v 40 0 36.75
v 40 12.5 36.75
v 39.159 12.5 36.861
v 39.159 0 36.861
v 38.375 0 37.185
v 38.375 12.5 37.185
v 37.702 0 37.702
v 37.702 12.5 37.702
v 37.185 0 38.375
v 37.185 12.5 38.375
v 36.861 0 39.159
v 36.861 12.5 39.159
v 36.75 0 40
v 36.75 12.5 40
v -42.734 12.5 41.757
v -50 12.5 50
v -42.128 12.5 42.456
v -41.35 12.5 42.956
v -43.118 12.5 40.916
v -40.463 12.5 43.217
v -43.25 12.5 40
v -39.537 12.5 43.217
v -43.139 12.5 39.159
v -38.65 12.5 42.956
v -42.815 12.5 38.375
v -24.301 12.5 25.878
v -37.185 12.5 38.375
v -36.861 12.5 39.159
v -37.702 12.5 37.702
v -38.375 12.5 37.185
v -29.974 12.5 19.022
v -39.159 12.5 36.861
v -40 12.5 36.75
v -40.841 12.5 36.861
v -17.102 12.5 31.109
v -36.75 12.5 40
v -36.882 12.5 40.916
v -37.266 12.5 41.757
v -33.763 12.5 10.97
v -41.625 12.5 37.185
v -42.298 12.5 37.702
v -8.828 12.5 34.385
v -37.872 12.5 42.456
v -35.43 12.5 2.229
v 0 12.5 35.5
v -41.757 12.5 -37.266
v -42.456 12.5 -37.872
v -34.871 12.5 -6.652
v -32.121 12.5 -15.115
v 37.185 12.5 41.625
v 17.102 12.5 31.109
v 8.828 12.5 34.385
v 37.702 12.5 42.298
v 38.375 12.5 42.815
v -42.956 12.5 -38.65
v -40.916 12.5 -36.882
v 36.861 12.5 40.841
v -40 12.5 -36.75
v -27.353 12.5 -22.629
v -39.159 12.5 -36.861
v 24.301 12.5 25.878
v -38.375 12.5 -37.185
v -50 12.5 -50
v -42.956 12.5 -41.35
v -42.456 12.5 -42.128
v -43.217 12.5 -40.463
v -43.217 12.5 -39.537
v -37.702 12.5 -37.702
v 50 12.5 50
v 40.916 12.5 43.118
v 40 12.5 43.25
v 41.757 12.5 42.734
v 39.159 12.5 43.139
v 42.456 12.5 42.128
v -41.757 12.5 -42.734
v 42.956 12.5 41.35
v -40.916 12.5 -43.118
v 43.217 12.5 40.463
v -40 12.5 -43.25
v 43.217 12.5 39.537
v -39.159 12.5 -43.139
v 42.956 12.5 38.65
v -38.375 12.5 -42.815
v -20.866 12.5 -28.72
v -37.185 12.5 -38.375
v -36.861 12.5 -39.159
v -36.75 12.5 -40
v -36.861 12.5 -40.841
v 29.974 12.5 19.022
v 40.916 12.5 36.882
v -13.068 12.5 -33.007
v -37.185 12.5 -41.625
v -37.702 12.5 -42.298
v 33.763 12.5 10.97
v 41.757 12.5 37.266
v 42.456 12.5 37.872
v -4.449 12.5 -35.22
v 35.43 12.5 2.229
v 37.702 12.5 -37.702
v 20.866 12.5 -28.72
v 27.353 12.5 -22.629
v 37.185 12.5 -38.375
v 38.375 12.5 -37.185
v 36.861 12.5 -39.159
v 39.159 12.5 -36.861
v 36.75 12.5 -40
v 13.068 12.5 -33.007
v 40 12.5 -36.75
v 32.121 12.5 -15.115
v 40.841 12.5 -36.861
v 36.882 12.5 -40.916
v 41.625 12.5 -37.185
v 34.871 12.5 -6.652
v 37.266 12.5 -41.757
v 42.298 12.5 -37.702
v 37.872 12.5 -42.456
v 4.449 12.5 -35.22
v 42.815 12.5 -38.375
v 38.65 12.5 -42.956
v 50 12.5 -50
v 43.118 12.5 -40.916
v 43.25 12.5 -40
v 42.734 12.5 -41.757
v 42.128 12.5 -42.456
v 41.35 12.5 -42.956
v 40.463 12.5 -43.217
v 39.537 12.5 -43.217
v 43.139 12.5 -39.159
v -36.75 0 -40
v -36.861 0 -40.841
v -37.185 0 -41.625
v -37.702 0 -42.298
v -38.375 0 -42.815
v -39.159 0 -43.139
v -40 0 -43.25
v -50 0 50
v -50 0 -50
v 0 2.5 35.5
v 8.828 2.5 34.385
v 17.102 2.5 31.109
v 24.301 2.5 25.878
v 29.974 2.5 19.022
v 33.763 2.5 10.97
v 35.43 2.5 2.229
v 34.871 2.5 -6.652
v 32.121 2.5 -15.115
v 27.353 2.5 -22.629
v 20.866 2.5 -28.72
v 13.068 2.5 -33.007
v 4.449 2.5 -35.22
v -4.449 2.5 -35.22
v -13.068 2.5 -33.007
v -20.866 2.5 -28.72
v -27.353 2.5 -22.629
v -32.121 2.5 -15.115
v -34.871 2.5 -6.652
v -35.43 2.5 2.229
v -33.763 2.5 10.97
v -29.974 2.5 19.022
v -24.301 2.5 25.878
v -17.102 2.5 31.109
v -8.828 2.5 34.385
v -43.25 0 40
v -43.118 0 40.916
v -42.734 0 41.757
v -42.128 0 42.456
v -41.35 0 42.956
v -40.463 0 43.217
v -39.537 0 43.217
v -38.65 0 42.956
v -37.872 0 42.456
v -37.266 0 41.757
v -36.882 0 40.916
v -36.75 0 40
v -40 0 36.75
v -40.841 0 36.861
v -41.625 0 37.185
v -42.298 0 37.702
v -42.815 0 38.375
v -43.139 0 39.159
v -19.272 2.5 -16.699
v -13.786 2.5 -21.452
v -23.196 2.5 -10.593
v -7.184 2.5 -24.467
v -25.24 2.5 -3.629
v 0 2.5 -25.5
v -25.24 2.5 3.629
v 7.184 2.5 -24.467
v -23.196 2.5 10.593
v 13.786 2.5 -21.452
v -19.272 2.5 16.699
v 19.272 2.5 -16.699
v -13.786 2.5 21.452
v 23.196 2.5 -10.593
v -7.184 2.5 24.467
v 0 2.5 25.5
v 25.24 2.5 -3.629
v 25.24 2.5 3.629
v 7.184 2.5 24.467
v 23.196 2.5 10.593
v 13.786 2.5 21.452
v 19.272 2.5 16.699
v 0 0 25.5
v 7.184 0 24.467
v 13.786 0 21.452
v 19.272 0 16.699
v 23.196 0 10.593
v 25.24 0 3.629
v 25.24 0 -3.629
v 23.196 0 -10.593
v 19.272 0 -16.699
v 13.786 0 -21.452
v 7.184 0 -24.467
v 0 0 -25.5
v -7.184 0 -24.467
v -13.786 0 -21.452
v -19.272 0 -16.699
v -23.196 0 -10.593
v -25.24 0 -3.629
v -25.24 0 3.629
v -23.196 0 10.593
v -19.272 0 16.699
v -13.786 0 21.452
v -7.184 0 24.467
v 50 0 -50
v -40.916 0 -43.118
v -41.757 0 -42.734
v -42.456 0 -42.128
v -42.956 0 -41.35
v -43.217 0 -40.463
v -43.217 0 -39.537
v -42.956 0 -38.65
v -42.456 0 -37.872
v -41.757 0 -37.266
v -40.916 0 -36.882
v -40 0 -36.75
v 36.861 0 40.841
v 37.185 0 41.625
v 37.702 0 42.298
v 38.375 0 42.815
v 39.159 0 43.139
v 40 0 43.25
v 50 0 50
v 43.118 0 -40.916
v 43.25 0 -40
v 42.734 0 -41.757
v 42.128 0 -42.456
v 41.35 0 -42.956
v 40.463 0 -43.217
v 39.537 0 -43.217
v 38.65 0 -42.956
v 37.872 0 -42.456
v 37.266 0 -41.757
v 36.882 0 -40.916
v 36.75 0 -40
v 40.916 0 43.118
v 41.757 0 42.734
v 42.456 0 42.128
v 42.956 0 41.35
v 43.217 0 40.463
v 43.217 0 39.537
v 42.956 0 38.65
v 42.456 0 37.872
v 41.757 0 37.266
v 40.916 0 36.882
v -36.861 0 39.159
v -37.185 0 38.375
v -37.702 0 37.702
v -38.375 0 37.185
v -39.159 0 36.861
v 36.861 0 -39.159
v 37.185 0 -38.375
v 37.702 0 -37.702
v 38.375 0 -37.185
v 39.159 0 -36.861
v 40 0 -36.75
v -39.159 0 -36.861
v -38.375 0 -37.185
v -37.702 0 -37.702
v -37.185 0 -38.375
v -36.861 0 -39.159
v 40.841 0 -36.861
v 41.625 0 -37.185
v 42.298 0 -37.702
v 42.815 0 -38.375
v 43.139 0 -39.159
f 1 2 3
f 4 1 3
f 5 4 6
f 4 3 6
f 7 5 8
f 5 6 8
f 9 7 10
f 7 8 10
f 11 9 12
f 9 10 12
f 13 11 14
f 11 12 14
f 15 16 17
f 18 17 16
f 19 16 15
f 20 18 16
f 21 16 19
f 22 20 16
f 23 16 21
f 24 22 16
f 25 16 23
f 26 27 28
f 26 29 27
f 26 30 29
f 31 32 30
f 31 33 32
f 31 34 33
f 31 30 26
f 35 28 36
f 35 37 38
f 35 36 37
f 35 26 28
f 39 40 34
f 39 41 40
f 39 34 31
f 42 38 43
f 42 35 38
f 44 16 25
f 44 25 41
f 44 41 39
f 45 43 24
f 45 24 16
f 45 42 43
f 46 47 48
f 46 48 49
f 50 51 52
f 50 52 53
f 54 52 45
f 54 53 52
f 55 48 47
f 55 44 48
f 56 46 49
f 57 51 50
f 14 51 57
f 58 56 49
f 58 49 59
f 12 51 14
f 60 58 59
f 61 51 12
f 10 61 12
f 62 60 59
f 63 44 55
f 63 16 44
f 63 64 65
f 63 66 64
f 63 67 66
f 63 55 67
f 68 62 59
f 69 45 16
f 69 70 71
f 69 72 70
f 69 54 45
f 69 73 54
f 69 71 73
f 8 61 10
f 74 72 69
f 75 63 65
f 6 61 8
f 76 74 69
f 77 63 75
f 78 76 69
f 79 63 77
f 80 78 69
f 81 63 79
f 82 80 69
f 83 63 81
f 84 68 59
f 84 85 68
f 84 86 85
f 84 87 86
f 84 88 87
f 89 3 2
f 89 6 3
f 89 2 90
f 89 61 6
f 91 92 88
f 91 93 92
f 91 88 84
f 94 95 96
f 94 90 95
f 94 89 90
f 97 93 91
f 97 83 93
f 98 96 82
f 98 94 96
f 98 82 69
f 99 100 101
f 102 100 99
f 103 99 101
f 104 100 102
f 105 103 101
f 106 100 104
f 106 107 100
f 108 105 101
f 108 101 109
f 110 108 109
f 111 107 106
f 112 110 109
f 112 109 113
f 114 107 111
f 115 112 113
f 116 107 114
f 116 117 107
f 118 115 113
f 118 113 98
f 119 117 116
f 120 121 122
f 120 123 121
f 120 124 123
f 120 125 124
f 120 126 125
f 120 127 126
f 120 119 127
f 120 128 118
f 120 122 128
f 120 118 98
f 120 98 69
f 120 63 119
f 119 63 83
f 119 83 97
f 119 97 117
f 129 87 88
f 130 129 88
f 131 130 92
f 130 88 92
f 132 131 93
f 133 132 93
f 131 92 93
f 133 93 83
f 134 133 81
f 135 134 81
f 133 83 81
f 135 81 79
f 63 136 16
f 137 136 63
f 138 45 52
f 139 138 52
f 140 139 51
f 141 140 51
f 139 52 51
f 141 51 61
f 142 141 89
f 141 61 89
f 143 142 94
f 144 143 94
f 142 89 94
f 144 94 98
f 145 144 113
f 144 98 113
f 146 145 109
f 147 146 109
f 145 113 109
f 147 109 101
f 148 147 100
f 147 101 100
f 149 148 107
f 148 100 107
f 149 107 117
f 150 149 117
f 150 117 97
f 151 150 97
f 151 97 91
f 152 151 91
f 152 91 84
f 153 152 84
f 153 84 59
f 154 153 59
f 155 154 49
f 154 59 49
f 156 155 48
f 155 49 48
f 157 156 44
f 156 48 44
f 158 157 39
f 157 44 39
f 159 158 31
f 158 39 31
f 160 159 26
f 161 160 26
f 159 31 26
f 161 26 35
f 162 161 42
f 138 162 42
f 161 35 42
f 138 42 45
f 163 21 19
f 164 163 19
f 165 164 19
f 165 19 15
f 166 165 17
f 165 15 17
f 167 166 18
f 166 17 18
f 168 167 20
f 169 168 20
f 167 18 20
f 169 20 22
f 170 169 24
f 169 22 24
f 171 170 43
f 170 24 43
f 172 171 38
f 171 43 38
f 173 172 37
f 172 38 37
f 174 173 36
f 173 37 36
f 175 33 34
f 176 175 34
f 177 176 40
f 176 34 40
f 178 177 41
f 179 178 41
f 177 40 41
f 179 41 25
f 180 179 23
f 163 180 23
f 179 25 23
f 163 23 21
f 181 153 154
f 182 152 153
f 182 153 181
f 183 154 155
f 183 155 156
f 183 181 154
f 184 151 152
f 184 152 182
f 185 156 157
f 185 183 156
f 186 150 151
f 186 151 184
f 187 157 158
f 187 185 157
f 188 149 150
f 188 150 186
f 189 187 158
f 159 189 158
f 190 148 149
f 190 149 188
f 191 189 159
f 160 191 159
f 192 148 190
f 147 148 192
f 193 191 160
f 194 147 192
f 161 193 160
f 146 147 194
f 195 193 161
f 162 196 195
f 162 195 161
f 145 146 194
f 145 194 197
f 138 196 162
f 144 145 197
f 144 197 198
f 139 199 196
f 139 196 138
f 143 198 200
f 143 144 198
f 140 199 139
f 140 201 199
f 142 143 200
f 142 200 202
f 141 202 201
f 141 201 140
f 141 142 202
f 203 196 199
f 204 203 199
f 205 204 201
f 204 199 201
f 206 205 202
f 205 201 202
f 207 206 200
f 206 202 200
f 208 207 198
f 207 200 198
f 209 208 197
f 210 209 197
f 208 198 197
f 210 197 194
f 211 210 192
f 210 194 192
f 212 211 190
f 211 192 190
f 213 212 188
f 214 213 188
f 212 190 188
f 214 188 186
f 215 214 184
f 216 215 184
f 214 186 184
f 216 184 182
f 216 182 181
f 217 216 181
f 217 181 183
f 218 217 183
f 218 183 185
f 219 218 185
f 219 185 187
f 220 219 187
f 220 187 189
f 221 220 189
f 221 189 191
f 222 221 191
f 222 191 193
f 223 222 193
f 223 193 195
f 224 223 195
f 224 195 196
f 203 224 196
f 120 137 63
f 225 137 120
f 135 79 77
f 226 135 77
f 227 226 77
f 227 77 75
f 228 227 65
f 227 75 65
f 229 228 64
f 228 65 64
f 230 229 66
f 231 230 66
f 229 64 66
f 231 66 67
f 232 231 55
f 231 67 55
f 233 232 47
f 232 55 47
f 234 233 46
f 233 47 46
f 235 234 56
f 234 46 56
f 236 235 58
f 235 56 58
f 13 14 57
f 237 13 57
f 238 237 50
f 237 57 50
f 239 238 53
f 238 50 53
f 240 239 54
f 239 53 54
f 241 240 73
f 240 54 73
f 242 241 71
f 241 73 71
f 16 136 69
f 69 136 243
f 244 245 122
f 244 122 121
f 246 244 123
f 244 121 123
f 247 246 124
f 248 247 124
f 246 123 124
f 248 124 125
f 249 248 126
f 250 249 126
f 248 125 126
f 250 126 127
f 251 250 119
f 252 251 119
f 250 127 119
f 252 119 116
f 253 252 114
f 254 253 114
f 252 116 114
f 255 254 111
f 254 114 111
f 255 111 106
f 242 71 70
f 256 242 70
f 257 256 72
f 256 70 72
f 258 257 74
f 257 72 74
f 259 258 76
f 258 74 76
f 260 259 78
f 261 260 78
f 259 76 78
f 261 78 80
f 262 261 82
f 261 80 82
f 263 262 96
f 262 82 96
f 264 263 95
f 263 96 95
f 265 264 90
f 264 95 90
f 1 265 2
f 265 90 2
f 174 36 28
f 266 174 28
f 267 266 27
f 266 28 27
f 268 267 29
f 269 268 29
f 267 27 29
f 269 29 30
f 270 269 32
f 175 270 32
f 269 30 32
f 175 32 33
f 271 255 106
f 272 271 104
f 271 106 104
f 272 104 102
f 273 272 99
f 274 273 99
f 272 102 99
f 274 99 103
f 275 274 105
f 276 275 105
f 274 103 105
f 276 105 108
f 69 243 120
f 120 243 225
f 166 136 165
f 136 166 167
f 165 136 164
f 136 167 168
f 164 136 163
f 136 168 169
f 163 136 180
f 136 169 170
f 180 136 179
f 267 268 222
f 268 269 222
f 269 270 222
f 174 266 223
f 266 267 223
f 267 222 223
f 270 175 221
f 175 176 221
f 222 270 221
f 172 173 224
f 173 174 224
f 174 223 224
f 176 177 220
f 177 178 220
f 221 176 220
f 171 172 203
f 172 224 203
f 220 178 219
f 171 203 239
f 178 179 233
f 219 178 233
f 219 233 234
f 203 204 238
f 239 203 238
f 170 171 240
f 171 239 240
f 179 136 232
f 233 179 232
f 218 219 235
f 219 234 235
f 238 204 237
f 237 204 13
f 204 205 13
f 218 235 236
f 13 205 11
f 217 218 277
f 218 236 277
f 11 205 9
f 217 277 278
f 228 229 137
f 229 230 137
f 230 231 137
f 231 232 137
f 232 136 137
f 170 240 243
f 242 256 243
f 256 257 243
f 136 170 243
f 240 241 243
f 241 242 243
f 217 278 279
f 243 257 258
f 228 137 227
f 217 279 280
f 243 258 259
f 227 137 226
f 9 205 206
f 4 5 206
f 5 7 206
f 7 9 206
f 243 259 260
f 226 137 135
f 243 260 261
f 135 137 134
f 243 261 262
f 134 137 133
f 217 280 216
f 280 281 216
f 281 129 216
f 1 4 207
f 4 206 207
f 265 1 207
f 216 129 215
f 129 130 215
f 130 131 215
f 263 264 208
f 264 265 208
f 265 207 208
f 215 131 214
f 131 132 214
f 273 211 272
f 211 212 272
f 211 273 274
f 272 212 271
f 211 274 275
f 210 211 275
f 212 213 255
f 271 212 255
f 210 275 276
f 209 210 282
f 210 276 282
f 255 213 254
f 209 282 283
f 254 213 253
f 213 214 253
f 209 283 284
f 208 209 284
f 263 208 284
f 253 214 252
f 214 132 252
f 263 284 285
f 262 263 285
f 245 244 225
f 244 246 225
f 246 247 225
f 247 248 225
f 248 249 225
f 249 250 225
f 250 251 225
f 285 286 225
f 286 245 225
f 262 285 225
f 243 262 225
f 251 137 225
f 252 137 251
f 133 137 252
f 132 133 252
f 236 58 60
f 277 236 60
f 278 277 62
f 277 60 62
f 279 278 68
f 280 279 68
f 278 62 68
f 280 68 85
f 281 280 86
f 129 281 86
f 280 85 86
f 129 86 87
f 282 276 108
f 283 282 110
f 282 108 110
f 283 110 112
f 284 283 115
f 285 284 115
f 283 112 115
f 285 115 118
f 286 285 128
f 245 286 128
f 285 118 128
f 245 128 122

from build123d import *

# Parameters (mm, degrees)
CROQUIS1_W              = 100
CROQUIS1_H              = 100
SALIENTE_EXTRUIR1_DEPTH = 12.5
CROQUIS2_R              = 35.5
CORTAR_EXTRUIR1_DEPTH   = 10
CROQUIS3_R              = 25.5
CORTAR_EXTRUIR2_DEPTH   = 72.414284285
CORTAR_EXTRUIR3_DEPTH   = 72.807033082
MATRIZC1_COUNT          = 4


with BuildPart() as part:
    # Croquis1 → Saliente-Extruir1 (new body)
    with BuildSketch(Plane(origin=(0, 0, 0), x_dir=(1, 0, 0), z_dir=(0, 1, 0))):
        Rectangle(CROQUIS1_W, CROQUIS1_H)
    extrude(amount=SALIENTE_EXTRUIR1_DEPTH)

    # Croquis2 → Cortar-Extruir1 (cut)
    with BuildSketch(Plane(origin=(0, 12.5, 0), x_dir=(1, 0, 0), z_dir=(0, 1, 0))):
        with Locations(Location((0, 0, 0), (0, 0, 270))):
            Circle(CROQUIS2_R)
    extrude(amount=-CORTAR_EXTRUIR1_DEPTH, mode=Mode.SUBTRACT)

    # Croquis3 → Cortar-Extruir2 (cut, through all)
    with BuildSketch(Plane(origin=(0, 2.5, 0), x_dir=(1, 0, 0), z_dir=(0, 1, 0))):
        with Locations(Location((0, 0, 0), (0, 0, 270))):
            Circle(CROQUIS3_R)
    extrude(amount=-CORTAR_EXTRUIR2_DEPTH, mode=Mode.SUBTRACT)

    # Croquis4 → Cortar-Extruir3 (cut, through all)
    with BuildSketch(Plane(origin=(0, 12.5, 0), x_dir=(1, 0, 0), z_dir=(0, 1, 0))):
        with BuildLine():
            ThreePointArc((36.75, 40), (37.701902961, 37.701902961), (40, 36.75))
            Line((40, 36.75), (40, 40))
            Line((40, 40), (36.75, 40))
        make_face()
        with BuildLine():
            Line((40, 40), (40, 36.75))
            ThreePointArc((40, 36.75), (42.298097039, 37.701902961), (43.25, 40))
            ThreePointArc((43.25, 40), (40, 43.25), (36.75, 40))
            Line((36.75, 40), (40, 40))
        make_face()
    cortar_extruir3 = extrude(amount=-CORTAR_EXTRUIR3_DEPTH, mode=Mode.SUBTRACT)

    # MatrizC1: Cortar-Extruir3 ×4 about axis
    matrizc1_axis = Axis((0, 0, 0), (0, 1, 0))
    for i in range(1, MATRIZC1_COUNT):
        add(cortar_extruir3.rotate(matrizc1_axis, i * 360 / MATRIZC1_COUNT), mode=Mode.SUBTRACT)


solid = part.part
